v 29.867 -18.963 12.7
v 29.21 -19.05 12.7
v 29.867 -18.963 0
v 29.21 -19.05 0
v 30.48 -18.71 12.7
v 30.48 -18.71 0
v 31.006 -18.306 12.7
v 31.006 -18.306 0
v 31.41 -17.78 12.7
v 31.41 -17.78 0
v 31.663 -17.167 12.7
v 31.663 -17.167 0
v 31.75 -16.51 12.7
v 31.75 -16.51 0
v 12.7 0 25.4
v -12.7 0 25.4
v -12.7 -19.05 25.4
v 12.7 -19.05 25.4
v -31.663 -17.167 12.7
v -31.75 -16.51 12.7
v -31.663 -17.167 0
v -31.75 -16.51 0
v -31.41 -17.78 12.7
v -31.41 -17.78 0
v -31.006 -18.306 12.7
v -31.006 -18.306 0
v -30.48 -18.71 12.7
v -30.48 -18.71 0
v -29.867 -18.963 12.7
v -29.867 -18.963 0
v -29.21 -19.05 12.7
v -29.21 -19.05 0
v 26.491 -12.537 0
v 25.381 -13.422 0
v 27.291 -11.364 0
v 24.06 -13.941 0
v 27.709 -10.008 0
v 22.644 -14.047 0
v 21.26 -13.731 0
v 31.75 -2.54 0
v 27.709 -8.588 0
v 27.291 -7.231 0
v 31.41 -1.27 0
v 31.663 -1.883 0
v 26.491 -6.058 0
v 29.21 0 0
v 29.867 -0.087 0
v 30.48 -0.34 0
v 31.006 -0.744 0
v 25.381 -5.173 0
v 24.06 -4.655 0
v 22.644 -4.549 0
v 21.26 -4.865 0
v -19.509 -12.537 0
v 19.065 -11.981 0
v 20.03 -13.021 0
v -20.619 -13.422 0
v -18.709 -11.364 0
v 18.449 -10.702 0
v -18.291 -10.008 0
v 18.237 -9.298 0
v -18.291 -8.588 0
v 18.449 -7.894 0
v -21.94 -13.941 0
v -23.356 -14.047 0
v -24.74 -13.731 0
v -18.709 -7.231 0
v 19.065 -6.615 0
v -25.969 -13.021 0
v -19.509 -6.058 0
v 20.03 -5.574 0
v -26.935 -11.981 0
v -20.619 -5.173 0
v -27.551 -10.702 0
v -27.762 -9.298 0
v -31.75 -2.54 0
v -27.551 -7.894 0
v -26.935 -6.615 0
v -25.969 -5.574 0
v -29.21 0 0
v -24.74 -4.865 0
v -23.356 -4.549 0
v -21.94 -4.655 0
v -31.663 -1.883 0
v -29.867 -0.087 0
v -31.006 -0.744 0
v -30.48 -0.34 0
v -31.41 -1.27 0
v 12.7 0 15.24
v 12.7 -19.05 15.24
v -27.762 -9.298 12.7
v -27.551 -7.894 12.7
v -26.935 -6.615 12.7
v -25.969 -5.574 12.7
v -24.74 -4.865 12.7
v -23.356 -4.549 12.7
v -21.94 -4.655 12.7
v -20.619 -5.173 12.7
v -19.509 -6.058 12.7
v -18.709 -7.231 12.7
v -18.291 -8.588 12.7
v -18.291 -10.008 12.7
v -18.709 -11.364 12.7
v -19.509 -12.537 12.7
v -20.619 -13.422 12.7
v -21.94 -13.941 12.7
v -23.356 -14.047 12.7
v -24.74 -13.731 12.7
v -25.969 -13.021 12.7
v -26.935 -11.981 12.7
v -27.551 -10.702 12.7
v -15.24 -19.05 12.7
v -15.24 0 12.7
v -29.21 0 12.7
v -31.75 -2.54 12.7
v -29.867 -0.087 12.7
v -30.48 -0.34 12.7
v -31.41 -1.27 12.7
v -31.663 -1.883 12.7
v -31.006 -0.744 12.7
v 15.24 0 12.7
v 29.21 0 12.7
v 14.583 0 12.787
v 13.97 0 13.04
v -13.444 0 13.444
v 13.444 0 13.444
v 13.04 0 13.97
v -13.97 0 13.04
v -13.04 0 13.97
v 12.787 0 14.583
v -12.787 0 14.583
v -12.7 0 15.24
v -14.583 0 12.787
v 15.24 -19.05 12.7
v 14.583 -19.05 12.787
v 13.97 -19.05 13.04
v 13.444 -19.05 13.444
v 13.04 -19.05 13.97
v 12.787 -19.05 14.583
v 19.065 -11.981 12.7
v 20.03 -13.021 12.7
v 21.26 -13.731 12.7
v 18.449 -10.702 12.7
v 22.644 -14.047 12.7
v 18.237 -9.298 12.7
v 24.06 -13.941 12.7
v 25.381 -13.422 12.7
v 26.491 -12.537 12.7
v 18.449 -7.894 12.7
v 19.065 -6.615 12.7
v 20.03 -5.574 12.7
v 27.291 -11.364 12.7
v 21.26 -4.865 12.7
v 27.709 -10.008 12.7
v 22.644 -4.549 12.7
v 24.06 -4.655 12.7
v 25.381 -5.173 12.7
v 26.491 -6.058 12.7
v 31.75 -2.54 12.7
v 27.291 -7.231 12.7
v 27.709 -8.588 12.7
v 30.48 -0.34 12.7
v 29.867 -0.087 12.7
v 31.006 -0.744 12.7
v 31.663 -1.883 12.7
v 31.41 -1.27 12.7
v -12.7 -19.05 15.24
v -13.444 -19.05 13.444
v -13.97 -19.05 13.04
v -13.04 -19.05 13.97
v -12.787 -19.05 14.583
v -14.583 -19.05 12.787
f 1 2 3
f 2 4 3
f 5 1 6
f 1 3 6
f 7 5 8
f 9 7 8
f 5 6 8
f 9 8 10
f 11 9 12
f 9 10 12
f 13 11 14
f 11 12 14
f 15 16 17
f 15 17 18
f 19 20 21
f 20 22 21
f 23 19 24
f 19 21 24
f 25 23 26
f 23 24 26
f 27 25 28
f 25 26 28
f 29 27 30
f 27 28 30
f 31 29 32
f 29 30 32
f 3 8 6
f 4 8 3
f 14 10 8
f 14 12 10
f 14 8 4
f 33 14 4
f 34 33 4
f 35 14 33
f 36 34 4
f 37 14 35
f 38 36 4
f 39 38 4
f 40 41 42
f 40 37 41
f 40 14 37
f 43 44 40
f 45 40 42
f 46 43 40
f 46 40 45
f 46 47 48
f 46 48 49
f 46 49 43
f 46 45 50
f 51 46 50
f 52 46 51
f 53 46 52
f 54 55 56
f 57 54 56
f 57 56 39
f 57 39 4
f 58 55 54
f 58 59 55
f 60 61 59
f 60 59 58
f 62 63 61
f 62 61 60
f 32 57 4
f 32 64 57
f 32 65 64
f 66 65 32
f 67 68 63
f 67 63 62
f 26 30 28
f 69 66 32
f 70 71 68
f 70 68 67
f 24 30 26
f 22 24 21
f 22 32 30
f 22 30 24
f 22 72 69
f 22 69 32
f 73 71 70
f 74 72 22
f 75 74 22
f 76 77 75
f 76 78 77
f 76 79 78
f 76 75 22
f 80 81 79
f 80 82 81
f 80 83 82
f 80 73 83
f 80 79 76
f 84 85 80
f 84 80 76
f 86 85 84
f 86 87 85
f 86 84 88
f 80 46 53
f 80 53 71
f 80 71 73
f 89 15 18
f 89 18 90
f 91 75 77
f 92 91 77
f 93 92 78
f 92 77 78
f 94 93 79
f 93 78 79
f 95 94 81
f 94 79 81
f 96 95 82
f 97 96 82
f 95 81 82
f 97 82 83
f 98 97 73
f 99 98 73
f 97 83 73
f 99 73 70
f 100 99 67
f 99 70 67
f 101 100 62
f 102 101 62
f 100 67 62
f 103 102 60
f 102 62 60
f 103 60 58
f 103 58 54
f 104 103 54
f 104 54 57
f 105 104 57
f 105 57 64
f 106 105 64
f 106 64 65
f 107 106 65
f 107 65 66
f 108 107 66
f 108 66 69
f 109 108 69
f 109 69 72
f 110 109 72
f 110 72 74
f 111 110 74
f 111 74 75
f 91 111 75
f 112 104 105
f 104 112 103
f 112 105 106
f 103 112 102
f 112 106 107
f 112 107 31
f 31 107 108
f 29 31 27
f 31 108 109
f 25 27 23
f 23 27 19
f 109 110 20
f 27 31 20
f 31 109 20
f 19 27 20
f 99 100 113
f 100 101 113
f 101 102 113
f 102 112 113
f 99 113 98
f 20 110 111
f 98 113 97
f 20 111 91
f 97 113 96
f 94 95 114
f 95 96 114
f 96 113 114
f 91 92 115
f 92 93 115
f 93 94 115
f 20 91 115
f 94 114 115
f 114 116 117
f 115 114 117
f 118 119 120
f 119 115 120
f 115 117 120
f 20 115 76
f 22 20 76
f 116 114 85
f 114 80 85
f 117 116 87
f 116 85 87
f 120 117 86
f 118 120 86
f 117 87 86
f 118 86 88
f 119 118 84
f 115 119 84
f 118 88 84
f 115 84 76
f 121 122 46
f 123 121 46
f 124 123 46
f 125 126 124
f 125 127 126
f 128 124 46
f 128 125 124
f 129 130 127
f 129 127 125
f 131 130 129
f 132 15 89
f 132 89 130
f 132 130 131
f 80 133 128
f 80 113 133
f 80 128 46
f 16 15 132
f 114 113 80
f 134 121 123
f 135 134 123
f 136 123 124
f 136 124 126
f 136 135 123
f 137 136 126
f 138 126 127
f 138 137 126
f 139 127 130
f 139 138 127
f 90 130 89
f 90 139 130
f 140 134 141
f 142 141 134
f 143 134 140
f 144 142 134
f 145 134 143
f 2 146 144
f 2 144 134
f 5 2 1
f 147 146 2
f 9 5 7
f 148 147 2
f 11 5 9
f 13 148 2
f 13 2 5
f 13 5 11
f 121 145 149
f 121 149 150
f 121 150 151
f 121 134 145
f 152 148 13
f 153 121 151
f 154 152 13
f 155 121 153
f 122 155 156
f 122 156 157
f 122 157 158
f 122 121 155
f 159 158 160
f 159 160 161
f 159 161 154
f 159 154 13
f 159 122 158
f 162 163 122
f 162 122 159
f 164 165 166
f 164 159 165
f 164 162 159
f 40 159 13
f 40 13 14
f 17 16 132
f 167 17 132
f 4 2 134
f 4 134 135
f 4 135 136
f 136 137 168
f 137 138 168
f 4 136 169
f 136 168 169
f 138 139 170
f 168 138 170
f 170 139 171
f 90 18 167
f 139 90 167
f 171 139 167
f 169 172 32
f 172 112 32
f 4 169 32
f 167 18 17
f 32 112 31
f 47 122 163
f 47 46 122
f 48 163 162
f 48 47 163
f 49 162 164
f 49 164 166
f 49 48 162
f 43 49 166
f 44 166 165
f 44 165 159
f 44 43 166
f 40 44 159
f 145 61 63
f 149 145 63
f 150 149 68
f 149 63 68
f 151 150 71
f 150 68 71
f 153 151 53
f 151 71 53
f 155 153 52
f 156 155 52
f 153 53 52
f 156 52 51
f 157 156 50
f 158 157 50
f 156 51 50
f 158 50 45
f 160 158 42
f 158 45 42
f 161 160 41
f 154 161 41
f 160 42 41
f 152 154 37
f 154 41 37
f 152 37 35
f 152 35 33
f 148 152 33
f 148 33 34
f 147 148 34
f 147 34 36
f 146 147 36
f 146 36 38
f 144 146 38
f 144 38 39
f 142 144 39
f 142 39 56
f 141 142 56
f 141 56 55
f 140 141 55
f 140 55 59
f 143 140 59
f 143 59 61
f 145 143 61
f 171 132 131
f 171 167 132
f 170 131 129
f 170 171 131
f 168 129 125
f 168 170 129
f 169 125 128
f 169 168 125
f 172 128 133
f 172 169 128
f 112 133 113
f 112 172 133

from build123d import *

# Parameters (mm, degrees)
F1_DEPTH = 19.05
F3_R     = 2.54
F6_D     = 9.525


with BuildPart() as f1:
    # F0 (on Front) → F1 (new body)
    with BuildSketch(Plane.XZ):
        Polygon((-31.75, 0), (0, 0), (0, 25.4), (-12.7, 25.4), (-12.7, 12.7), (-31.75, 12.7), align=None)
    extrude(amount=F1_DEPTH)

    # F2: F1 across face


with BuildPart() as f1_1:
    add(f1.part)
    add(f1.part.mirror(Plane(origin=(0, -9.525, 12.7), x_dir=(0, 1, 0), z_dir=(1, 0, 0))))

    # F3
    f3_edges = [f1_1.edges().sort_by_distance(p)[0] for p in [
        (-31.75, -19.05, 6.35),
        (-31.75, 0, 6.35),
        (31.75, -19.05, 6.35),
        (31.75, 0, 6.35),
        (12.7, -9.525, 12.7),
        (-12.7, -9.525, 12.7),
    ]]
    fillet(f3_edges, radius=F3_R)

    # F6 (through all)
    with Locations(Plane.XY.offset(12.954)):
        with Locations((-22.9998156428, -9.2977983877), (22.9998193681, -9.2977983877)):
            Hole(F6_D / 2)


solid = f1_1.part
